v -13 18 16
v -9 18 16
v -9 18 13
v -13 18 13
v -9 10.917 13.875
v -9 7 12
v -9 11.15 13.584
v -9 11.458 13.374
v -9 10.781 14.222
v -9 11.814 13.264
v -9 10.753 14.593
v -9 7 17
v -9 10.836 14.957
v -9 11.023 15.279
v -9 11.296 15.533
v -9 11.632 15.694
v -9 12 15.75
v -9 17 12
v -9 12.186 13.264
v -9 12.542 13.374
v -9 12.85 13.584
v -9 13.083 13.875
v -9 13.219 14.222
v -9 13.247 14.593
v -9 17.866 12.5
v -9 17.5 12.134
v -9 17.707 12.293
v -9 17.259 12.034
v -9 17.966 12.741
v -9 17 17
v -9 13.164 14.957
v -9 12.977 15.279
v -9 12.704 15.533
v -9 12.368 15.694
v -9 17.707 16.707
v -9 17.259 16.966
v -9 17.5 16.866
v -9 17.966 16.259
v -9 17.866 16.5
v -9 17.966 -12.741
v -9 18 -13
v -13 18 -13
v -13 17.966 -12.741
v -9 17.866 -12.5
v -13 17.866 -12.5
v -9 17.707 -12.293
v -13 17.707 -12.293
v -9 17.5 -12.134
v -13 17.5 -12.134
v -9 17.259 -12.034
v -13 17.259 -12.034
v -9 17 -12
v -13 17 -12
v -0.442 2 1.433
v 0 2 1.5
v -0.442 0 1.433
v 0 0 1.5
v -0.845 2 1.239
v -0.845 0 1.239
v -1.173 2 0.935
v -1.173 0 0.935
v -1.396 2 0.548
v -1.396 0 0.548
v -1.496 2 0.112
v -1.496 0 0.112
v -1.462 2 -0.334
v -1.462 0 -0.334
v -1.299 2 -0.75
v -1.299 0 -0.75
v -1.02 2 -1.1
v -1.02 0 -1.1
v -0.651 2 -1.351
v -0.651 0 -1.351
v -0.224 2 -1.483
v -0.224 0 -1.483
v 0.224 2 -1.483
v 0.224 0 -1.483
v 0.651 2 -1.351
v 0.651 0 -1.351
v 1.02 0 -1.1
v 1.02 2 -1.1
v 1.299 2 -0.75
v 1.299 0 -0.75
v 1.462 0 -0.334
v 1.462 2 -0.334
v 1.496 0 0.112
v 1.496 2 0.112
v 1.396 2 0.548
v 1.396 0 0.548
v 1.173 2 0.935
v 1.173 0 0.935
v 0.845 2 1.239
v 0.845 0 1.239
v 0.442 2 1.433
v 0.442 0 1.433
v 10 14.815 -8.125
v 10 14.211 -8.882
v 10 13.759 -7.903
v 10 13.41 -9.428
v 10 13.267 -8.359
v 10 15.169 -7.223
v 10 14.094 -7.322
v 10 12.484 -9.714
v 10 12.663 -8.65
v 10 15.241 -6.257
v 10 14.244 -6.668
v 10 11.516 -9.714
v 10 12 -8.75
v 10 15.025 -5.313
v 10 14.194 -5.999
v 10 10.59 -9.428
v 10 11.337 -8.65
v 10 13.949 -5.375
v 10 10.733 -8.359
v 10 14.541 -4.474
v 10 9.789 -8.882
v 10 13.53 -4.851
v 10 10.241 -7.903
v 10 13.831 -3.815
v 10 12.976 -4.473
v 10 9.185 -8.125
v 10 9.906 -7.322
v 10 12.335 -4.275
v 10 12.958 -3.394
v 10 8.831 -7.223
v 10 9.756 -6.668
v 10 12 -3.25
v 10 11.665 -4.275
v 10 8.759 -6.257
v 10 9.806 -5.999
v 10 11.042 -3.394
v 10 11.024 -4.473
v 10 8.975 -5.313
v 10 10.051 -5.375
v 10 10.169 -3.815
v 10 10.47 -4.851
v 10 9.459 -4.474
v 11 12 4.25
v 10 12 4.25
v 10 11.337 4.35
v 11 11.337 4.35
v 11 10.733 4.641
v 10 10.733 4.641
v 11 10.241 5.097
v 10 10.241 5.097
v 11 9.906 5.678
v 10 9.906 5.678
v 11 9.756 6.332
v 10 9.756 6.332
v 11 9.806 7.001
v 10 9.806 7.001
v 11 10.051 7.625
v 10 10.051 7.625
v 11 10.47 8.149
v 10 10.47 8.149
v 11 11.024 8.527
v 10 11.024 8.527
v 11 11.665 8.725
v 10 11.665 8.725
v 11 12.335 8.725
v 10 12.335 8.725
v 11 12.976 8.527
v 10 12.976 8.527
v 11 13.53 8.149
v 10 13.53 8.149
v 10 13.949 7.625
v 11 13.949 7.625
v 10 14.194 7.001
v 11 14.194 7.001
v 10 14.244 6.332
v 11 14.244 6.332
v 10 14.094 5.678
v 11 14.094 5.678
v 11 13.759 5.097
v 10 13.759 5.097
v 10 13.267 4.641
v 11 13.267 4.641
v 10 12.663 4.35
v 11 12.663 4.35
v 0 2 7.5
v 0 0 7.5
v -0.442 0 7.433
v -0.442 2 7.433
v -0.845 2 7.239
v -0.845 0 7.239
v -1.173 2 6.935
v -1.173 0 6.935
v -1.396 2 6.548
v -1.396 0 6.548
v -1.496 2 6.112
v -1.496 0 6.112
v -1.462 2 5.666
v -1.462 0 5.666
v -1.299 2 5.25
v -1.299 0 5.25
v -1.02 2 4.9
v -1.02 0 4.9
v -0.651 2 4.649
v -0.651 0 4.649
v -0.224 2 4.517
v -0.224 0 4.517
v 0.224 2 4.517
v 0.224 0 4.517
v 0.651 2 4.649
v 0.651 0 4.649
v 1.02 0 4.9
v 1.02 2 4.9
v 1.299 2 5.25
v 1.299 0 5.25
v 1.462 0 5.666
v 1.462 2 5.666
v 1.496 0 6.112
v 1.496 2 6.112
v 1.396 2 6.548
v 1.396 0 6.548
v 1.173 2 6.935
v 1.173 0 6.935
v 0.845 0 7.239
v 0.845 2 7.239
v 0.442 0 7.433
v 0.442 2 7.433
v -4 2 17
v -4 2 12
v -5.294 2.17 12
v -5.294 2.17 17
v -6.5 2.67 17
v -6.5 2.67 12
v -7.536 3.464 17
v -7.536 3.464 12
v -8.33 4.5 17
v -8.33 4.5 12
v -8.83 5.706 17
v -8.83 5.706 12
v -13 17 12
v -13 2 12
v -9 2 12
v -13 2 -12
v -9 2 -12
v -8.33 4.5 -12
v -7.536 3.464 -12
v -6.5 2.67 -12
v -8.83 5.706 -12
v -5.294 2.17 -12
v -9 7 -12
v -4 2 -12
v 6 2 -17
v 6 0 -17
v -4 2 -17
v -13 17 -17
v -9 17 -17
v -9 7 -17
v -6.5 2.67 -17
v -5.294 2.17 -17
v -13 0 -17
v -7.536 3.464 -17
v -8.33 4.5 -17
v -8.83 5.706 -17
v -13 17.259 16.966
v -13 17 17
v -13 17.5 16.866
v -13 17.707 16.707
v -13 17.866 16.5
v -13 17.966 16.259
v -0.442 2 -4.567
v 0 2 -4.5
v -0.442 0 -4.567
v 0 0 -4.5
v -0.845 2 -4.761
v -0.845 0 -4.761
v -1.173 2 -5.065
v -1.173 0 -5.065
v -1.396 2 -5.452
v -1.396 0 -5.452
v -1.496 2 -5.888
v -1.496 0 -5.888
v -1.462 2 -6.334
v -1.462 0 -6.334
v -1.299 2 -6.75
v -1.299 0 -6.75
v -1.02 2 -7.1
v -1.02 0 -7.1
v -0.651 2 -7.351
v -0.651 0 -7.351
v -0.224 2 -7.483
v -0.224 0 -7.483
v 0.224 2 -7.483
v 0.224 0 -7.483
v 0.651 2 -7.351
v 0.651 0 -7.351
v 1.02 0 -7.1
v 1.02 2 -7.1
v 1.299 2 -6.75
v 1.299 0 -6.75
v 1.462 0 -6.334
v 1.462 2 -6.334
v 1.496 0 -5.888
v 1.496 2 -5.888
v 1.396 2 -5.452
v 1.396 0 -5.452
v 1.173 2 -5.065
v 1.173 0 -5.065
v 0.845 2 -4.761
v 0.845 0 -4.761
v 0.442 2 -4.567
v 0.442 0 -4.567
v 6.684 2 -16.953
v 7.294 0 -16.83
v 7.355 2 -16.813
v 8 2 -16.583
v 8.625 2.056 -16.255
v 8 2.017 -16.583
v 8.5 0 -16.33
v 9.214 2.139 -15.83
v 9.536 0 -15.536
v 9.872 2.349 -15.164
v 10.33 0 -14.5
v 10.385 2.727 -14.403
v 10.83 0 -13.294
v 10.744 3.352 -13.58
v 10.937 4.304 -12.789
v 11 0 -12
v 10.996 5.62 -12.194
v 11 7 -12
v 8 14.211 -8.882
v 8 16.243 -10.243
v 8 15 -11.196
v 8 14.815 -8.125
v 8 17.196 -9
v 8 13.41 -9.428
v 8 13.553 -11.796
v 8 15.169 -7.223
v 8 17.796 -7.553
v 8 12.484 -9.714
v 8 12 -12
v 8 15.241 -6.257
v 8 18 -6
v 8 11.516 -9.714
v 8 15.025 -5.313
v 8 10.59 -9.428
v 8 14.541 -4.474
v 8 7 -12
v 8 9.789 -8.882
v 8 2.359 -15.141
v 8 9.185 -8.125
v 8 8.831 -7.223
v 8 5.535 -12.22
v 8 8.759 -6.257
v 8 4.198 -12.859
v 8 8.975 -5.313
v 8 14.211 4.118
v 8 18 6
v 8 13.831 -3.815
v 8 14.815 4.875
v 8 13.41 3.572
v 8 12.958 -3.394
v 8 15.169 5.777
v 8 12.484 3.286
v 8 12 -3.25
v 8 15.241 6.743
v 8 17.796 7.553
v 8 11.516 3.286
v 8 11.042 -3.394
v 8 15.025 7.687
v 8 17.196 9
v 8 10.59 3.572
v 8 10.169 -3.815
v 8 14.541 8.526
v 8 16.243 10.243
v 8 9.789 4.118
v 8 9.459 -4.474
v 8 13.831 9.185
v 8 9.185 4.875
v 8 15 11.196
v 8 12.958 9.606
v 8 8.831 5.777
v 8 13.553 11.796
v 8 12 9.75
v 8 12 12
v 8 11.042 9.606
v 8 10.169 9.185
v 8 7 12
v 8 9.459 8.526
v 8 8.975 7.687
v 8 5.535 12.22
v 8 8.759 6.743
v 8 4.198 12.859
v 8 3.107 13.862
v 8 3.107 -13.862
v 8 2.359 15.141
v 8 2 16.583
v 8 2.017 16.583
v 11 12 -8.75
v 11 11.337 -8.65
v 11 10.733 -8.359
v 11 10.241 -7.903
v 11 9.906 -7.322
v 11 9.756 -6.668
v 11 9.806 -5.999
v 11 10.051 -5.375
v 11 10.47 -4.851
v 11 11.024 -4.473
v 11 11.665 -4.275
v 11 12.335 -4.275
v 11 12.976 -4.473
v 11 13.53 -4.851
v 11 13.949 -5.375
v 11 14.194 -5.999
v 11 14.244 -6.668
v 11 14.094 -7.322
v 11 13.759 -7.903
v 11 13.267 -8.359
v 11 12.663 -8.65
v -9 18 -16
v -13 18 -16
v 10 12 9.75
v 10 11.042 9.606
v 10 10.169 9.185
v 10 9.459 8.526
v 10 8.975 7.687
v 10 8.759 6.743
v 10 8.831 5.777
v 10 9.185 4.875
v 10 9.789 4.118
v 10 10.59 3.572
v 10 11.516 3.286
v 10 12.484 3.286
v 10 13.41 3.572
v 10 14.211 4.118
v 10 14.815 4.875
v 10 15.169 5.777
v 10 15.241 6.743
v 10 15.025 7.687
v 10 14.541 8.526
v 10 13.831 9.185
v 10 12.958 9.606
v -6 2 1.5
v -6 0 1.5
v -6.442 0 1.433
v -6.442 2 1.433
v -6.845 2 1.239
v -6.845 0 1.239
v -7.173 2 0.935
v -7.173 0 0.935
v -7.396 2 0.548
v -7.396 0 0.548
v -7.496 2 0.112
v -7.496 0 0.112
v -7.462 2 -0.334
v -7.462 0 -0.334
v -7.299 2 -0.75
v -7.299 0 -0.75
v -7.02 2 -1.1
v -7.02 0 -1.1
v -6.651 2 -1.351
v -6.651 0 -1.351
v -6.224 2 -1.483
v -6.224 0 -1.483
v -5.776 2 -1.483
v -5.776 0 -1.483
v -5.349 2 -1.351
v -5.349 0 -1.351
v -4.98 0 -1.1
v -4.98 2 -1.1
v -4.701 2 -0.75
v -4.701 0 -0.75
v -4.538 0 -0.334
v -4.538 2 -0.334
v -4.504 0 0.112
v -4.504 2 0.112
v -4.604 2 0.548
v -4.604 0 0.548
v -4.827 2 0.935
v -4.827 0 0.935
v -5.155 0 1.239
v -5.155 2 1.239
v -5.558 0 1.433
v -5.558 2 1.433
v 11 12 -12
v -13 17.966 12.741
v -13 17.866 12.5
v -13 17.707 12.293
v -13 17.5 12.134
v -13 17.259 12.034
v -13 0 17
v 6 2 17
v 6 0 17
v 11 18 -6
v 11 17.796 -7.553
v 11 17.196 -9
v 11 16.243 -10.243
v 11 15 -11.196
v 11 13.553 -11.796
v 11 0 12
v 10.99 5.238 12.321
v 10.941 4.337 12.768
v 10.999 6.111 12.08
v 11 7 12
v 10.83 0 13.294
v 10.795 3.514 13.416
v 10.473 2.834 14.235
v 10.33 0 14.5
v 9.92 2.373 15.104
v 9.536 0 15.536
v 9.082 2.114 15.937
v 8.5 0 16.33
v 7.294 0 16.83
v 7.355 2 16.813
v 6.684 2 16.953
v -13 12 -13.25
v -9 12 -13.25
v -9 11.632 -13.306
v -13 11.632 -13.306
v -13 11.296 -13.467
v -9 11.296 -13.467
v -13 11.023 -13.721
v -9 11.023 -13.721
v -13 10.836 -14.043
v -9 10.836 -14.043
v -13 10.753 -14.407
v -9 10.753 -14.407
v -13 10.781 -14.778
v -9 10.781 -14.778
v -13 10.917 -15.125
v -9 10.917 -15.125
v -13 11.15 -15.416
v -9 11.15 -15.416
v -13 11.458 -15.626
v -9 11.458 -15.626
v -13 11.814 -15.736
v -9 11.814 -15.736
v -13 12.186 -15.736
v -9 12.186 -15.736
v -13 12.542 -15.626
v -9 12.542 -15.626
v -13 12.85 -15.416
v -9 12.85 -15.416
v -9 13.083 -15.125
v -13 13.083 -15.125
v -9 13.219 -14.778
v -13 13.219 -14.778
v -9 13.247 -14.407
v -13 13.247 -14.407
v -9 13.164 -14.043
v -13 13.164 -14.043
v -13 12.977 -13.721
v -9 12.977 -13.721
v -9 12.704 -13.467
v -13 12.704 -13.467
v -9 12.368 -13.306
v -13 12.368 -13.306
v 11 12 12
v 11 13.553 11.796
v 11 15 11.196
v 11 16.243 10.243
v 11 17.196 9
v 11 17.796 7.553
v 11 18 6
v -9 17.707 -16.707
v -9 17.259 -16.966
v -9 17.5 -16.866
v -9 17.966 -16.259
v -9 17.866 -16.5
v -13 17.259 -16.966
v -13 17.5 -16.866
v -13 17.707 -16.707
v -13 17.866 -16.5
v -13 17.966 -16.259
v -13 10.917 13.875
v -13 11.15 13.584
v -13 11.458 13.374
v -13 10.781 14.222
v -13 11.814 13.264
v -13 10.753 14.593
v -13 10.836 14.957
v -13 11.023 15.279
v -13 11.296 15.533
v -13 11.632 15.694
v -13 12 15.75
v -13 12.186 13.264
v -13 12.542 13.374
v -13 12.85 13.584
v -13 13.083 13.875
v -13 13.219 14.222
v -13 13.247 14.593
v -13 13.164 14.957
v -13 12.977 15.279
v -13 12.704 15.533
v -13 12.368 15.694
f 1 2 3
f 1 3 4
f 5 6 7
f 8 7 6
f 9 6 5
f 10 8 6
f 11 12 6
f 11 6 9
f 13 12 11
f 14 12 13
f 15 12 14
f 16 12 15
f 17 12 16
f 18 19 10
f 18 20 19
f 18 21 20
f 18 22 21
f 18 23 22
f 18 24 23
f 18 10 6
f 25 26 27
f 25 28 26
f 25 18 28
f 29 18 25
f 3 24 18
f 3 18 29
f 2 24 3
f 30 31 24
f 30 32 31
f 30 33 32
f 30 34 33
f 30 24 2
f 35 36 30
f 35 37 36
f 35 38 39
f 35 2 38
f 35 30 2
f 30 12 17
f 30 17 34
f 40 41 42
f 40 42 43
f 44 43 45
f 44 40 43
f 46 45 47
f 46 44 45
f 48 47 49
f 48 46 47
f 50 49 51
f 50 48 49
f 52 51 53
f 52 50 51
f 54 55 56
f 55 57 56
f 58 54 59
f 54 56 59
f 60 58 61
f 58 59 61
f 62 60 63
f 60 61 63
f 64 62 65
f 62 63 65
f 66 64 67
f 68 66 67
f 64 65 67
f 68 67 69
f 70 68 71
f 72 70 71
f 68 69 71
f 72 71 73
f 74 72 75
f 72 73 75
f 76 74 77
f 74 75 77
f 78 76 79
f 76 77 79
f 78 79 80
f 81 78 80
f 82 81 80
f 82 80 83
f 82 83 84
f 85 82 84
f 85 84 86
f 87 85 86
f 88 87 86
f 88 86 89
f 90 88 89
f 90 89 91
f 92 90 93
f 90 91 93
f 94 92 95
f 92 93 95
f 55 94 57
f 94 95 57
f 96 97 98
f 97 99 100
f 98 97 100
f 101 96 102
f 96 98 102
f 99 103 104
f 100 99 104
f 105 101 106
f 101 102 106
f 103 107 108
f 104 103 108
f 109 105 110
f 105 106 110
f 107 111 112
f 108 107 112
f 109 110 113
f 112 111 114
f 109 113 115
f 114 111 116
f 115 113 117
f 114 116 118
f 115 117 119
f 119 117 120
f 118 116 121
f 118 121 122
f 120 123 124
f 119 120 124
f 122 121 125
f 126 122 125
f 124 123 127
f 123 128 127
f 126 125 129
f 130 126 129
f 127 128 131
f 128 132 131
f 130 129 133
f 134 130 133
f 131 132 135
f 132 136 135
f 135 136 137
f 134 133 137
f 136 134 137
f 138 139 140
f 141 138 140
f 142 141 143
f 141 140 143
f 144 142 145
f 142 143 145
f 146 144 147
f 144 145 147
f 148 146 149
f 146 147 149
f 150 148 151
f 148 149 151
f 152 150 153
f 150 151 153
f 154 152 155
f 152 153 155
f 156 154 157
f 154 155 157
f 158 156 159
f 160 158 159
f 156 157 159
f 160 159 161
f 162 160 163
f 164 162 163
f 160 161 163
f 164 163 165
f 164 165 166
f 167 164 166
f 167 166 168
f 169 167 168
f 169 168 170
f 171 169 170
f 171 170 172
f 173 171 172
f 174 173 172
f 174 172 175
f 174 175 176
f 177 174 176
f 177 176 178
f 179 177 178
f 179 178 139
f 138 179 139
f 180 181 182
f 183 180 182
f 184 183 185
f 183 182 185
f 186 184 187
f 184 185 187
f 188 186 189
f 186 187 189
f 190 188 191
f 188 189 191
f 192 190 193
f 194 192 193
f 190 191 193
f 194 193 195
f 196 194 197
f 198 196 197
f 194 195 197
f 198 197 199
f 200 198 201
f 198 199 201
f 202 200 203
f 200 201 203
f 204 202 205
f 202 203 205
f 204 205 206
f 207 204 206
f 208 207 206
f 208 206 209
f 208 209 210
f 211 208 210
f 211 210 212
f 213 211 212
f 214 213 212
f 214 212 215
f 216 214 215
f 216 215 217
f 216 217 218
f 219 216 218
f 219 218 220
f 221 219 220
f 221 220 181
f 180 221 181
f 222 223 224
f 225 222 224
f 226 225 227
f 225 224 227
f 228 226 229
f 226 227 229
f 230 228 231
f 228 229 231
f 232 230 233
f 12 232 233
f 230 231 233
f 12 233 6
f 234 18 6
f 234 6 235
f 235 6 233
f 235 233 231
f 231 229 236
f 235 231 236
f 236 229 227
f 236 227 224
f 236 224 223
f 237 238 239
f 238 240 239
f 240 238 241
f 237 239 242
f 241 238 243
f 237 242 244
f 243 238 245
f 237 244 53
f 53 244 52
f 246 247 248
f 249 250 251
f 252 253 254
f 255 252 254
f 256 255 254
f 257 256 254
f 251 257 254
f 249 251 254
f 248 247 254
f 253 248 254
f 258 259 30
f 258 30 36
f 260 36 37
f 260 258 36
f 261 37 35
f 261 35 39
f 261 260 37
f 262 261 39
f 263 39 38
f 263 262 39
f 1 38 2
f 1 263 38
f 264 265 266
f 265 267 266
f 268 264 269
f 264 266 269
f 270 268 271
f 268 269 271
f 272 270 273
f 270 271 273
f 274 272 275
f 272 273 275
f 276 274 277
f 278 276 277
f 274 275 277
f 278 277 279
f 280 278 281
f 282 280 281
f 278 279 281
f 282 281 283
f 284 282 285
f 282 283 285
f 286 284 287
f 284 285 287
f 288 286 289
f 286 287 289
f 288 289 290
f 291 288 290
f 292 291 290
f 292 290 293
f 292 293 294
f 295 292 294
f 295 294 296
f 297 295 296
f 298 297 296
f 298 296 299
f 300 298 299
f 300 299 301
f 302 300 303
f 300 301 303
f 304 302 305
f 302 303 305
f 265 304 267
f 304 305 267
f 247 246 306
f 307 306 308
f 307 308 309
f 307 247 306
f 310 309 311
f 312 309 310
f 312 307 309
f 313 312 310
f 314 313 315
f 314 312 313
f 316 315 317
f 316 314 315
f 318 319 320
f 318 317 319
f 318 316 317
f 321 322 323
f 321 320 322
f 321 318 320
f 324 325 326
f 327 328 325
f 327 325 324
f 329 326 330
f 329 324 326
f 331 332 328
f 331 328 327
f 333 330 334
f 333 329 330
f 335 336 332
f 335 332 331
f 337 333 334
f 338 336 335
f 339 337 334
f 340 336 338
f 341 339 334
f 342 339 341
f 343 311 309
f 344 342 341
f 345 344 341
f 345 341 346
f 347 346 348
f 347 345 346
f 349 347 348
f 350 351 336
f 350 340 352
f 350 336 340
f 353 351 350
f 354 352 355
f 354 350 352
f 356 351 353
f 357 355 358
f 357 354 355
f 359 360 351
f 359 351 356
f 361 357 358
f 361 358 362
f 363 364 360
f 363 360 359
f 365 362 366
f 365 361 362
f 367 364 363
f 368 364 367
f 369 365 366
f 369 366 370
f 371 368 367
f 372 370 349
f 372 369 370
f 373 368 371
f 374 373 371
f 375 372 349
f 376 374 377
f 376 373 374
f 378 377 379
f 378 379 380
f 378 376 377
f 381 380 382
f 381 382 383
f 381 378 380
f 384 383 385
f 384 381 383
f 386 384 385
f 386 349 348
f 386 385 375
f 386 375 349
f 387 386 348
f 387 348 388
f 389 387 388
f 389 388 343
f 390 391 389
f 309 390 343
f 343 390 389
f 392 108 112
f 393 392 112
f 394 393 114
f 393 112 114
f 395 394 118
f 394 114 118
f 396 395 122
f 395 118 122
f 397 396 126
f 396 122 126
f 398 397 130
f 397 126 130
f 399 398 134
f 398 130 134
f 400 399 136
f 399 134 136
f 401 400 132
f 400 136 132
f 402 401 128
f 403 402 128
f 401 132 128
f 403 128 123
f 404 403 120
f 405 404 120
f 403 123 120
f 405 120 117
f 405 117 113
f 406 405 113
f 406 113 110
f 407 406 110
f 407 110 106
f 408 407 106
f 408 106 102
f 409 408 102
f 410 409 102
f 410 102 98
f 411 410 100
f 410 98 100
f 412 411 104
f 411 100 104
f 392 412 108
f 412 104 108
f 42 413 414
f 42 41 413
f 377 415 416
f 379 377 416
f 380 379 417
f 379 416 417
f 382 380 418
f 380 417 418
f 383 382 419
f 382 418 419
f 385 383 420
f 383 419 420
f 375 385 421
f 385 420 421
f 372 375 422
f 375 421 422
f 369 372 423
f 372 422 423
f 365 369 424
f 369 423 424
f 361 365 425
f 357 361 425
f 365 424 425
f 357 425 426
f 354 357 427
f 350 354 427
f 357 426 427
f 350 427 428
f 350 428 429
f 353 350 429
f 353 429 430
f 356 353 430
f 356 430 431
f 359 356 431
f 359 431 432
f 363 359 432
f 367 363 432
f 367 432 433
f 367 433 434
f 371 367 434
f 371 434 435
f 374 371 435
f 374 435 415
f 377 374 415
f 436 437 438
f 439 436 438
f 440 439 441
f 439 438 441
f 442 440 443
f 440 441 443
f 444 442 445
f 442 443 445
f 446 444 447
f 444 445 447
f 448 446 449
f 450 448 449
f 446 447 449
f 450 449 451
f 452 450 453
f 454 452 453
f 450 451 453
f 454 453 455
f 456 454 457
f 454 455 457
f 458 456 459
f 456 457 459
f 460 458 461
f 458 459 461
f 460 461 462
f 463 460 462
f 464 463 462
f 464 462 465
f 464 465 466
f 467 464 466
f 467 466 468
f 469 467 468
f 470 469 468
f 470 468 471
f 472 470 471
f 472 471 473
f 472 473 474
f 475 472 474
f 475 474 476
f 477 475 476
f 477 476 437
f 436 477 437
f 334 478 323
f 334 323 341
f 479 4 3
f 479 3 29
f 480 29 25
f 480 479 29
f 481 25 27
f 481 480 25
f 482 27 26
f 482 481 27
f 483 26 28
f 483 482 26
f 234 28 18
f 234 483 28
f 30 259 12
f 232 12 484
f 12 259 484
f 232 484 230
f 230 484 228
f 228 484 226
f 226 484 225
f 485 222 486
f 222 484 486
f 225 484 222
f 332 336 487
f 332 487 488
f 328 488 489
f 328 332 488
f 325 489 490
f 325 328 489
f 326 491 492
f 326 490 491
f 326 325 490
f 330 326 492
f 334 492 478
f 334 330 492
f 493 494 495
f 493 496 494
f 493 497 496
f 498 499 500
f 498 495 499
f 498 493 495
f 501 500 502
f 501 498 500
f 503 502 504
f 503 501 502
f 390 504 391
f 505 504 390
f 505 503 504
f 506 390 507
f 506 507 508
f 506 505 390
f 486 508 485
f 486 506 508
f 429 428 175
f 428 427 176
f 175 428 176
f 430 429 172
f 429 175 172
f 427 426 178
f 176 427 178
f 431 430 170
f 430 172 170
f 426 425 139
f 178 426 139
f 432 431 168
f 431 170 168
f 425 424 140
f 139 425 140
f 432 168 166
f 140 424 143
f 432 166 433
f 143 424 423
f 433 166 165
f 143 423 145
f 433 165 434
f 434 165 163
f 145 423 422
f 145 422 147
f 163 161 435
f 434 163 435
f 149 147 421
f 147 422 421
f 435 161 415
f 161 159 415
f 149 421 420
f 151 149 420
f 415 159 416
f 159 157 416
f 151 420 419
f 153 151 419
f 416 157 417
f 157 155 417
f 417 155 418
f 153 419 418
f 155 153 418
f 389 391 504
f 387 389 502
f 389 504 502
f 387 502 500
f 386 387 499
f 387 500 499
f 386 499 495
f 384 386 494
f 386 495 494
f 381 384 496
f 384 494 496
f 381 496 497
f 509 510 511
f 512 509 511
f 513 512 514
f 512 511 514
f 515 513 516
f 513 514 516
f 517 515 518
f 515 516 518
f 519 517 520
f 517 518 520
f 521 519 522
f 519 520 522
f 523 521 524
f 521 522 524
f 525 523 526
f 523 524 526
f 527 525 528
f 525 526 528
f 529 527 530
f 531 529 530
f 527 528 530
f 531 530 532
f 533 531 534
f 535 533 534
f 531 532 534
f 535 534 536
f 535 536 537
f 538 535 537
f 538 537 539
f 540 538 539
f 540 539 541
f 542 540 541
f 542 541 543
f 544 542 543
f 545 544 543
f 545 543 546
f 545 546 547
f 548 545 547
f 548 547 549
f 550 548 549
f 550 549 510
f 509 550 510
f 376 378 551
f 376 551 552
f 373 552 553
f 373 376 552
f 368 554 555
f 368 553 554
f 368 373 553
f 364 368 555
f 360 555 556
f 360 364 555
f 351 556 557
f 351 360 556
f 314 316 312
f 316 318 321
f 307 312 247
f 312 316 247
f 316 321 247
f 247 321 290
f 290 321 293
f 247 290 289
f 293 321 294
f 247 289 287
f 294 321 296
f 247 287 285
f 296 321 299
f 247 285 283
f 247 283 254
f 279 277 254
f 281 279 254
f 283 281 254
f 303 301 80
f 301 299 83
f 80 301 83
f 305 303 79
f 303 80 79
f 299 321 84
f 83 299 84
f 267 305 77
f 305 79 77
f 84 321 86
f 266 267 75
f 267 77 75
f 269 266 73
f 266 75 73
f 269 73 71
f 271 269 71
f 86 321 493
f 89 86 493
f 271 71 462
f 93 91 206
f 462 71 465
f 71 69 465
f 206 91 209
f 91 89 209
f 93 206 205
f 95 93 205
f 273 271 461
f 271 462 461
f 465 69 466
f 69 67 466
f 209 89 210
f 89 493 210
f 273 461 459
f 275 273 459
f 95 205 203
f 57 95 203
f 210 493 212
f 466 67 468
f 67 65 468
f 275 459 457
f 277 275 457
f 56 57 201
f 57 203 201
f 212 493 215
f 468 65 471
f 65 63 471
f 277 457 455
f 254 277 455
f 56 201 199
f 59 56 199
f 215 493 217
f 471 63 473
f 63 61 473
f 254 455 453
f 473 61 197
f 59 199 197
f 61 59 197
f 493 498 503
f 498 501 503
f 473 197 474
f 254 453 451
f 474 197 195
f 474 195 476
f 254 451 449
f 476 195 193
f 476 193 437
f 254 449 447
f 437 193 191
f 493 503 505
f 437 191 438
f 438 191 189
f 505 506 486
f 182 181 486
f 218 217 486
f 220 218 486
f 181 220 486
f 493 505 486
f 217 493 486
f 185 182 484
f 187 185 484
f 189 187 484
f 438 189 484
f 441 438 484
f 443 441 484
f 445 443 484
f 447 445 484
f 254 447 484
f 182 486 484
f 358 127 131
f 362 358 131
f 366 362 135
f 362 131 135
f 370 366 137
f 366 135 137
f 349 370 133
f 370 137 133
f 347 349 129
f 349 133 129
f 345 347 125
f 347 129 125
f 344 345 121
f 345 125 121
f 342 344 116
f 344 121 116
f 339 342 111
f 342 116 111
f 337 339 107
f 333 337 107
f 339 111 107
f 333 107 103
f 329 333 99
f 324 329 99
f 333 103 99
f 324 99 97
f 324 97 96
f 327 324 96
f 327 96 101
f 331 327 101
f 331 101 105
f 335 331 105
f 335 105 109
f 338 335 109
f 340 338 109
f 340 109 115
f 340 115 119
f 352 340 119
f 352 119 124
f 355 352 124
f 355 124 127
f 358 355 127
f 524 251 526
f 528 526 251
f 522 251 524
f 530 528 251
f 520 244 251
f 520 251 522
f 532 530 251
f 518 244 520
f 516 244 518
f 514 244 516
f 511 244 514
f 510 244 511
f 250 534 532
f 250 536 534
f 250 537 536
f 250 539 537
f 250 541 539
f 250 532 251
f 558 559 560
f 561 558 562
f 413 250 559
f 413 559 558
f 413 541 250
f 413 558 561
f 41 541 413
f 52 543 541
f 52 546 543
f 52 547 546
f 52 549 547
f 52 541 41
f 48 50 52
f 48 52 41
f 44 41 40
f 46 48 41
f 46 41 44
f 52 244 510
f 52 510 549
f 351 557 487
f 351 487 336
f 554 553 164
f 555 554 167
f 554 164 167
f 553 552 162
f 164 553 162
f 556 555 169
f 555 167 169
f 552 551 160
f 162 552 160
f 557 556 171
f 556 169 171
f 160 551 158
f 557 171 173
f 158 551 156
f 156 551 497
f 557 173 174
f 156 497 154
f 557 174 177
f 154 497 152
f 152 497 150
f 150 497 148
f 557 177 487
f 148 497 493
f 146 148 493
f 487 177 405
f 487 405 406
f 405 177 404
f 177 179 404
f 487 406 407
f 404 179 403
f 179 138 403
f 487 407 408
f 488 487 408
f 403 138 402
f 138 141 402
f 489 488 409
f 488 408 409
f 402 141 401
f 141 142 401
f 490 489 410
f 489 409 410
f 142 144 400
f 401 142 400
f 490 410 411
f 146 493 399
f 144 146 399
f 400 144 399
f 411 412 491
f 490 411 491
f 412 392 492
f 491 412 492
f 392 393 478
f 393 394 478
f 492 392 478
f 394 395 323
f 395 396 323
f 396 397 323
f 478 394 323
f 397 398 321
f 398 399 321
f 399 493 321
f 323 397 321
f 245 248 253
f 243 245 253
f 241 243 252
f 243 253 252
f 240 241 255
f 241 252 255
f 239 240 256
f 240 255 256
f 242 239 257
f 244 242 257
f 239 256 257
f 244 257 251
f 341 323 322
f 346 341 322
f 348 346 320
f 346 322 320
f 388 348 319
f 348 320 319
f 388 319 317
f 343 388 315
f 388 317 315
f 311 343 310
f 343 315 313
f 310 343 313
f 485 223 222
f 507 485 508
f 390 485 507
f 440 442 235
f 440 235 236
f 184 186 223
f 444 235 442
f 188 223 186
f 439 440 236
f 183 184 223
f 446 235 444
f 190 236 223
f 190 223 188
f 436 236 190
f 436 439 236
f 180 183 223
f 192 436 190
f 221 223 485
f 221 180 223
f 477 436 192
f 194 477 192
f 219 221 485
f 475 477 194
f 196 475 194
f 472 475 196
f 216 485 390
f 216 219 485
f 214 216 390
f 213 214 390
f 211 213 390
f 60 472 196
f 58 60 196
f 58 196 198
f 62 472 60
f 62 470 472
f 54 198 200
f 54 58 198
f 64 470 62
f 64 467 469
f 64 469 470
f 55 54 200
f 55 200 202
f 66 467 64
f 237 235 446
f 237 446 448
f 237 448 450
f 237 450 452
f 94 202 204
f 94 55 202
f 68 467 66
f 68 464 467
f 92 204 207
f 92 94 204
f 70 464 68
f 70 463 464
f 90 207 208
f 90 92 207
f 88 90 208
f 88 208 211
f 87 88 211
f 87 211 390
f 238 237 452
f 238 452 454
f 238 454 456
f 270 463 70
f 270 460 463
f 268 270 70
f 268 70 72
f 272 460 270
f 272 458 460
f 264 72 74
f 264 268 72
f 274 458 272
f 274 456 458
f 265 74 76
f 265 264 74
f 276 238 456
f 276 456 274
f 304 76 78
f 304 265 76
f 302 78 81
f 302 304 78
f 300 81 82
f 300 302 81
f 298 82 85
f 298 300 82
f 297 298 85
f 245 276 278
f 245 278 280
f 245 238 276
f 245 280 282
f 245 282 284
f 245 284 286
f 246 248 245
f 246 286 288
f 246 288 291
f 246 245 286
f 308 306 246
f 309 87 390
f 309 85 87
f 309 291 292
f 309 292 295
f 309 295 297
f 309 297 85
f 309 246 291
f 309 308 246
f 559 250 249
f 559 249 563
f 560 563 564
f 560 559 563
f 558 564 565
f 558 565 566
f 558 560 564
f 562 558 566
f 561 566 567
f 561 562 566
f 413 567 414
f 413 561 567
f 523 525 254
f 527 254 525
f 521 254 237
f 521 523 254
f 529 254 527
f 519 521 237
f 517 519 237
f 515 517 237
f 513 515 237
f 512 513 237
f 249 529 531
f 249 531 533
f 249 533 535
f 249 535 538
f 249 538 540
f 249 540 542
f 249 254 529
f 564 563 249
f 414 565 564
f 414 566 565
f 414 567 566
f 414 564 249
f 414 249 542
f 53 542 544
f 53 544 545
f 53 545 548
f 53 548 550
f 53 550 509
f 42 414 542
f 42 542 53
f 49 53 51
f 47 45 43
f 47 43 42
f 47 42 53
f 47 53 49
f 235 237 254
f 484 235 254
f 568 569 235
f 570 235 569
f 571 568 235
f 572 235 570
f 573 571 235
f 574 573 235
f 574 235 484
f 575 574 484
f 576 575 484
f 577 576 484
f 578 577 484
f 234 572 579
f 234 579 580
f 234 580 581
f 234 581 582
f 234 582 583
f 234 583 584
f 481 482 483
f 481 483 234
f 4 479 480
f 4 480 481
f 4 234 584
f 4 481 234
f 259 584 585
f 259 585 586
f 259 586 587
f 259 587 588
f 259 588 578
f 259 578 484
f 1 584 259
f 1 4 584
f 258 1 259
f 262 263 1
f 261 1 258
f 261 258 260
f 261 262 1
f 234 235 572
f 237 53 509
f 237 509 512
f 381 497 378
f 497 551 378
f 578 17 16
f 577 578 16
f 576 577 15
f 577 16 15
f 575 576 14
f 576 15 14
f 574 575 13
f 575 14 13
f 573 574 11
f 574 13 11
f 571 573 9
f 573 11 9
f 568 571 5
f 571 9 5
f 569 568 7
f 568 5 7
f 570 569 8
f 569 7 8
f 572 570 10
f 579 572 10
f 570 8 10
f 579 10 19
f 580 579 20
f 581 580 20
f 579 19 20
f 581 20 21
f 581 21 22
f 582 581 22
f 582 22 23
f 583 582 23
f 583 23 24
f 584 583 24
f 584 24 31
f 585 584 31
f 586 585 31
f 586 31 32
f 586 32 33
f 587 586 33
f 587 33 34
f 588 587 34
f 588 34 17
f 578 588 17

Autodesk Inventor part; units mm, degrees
ref_plane "YZ Plane" through (0, 0, 0) normal (1, 0, 0) x (0, 1, 0)
ref_plane "XZ Plane" through (0, 0, 0) normal (0, 1, 0) x (-1, 0, 0)
ref_plane "XY Plane" through (0, 0, 0) normal (0, 0, 1) x (1, 0, 0)
sketch "Sketch1" plane through (0, 0, 0) normal (0, 1, 0) x (-1, 0, 0)
  line L0 (15.4, 0) -> (-15.4, 0) projected
  line L1 (0, -23.8) -> (0, 23.8) projected
  line L2 (11, 17) -> (-11, 17)
  line L3 (-11, 17) -> (-11, -17)
  line L4 (-11, -17) -> (11, -17)
  line L5 (11, -17) -> (11, 17)
  point P0 (0, 0)
  dimension "d0" = 22
  dimension "d1" = 34
extrude "Extrusion1" add sketch "Sketch1" along normal blind 18
sketch "Sketch2" plane through (0, 18, 0) normal (0, 1, 0) x (1, 0, 0)
  line L0 (-11, -12) -> (8, -12)
  line L1 (8, -12) -> (8, 12)
  line L2 (8, 12) -> (-11, 12)
  line L3 (-11, 12) -> (-11, -12)
  line L4 (-11, -17) -> (11, -17) projected
  line L5 (11, -17) -> (11, 17) projected
  line L6 (11, 17) -> (-11, 17) projected
  line L7 (-11, 17) -> (-11, -17) projected
  line L8 (-15.4, 0) -> (15.4, 0) projected
  point P0 (0, 0)
  dimension "d5" = 24
  dimension "d6" = 3
extrude "Extrusion2" cut sketch "Sketch2" against normal blind 16 contours L3 L8 L1 L0 | L3 L2 L1 L8
sketch "Sketch3" plane through (-11, 0, 17) normal (0, 0, 1) x (1, 0, 0)
  line L0 (4, 18) -> (19, 18)
  line L1 (19, 18) -> (19, 2)
  line L2 (19, 2) -> (4, 2)
  line L3 (4, 2) -> (4, 18)
  line L4 (0, 18) -> (22, 18) projected
  line L5 (0, 0) -> (0, 18) projected
  line L6 (22, 0) -> (22, 18) projected
  line L7 (0, 0) -> (22, 0) projected
  point P0 (11, 0)
  dimension "d9" = 4
  dimension "d10" = 3
  dimension "d11" = 2
extrude "Extrusion3" cut sketch "Sketch3" against normal through all contours L0 L1 L2 L3
sketch "Sketch6" plane through (0, 2, 0) normal (0, 1, 0) x (1, 0, 0)
  line L0 (-11, 12) -> (-7, 12) projected
  line L1 (-11, -12) -> (-11, 12) projected
  line L2 (-7, -12) -> (-11, -12) projected
  line L3 (-7, -17) -> (-7, -12) projected
  line L4 (8, -17) -> (-7, -17) projected
  line L5 (-7, 17) -> (8, 17) projected
  line L6 (-7, 12) -> (-7, 17) projected
  line L7 (-15.4, 0) -> (15.4, 0) projected
  line L8 (0, 23.8) -> (0, -23.8) projected
  line L9 (8, -17) -> (8, 17) projected
  point P0 (0, 0)
  point P1 (0, 0)
  point P2 (0, 6)
  point P3 (0, -6)
  point P4 (-6, 0)
  dimension "d15" = 6
  dimension "d16" = 6
  dimension "d18" = 6
hole "Hole1" at (0, 2, -6) at (0, 2, 0) at (0, 2, 6) at (-6, 2, 0) direction (0, -1, 0) diameter 3 end through all
sketch "Sketch8" plane through (11, 0, 17) normal (1, 0, 0) x (0, 0, -1)
  line L0 (0, 0) -> (34, 0) projected
  line L1 (34, 0) -> (34, 18) projected
  line L2 (0, 18) -> (34, 18) projected
  line L3 (0, 0) -> (0, 18) projected
  line L4 (29, 2) -> (29, 18) projected
  line L5 (5, 18) -> (5, 2) projected
  line L6 (29, 2) -> (5, 2) projected
  point P0 (17, 0)
  point P1 (0, 2)
  point P2 (34, 2)
  point P3 (23.5, 12)
  point P4 (10.5, 12)
  dimension "d28" = 5.5
  dimension "d29" = 5.5
  dimension "d30" = 6
  dimension "d31" = 6
hole "Hole2" at (11, 12, -6.5) at (11, 12, 6.5) direction (-1, 0, 0) diameter 4.5 end through all
sketch "Sketch12" plane through (0, 18, 0) normal (0, 1, 0) x (1, 0, 0)
  line L0 (8, 17) -> (8, -17) projected
  line L1 (8, -17) -> (11, -17) projected
  line L2 (11, -17) -> (11, 17) projected
  line L3 (11, 17) -> (8, 17) projected
  line L4 (8, -17) -> (11, -17)
  line L5 (11, -17) -> (11, -12)
  line L6 (11, -12) -> (8, -12)
  line L7 (8, -12) -> (8, -17)
  line L8 (8, 17) -> (11, 17)
  line L9 (11, 17) -> (11, 12)
  line L10 (11, 12) -> (8, 12)
  line L11 (8, 12) -> (8, 17)
  line L12 (-7, -17) -> (-7, -12) projected
  line L13 (-7, -12) -> (-11, -12) projected
  line L14 (-11, -12) -> (-11, -17) projected
  line L15 (-11, -17) -> (-7, -17) projected
  line L16 (-7, 12) -> (-7, 17) projected
  line L17 (-7, 17) -> (-11, 17) projected
  line L18 (-11, 17) -> (-11, 12) projected
  line L19 (-11, 12) -> (-7, 12) projected
  point P0 (0, 0)
extrude "Extrusion5" cut sketch "Sketch12" against normal blind 16 contours L3 L2 L10 L0 | L6 L2 L1 L0
sketch "Sketch17" plane through (-11, 0, -17) normal (-1, 0, 0) x (0, 0, 1)
  line L0 (29, 18) -> (29, 2) projected
  line L1 (29, 2) -> (5, 2) projected
  line L2 (5, 2) -> (5, 18) projected
  line L3 (0, 18) -> (5, 18) projected
  line L4 (0, 0) -> (0, 18) projected
  line L5 (0, 0) -> (34, 0) projected
  line L6 (34, 0) -> (34, 18) projected
  line L7 (29, 18) -> (34, 18) projected
  line L8 (34, 0) -> (0, 0) projected
  line L9 (29, 18) -> (29, 2) projected
  line L10 (34, 0) -> (29, 0)
  line L11 (29, 0) -> (29, 18)
  line L12 (29, 18) -> (34, 18)
  line L13 (34, 18) -> (34, 0)
  line L14 (0, 18) -> (5, 18) projected
  line L15 (0, 0) -> (5, 0)
  line L16 (5, 0) -> (5, 18)
  line L17 (5, 18) -> (0, 18)
  line L18 (0, 18) -> (0, 0)
  line L19 (0, 2) -> (5, 2) projected
  line L20 (34, 0) -> (0, 0)
  line L21 (0, 0) -> (0, 2)
  line L22 (0, 2) -> (34, 2)
  line L23 (34, 2) -> (34, 0)
  point P0 (17, 0)
extrude "Extrusion6" add sketch "Sketch17" along normal blind 2
sketch "Sketch19" plane through (8, 18, -12) normal (-1, 0, 0) x (0, 0, 1)
  circle A0 centre (18.5, -6) radius 2.25 projected
  circle A1 centre (5.5, -6) radius 2.25 projected
  line L0 (24, -16) -> (24, 0) projected
  line L1 (0, 0) -> (24, 0) projected
  line L2 (0, 0) -> (0, -16) projected
  line L3 (24, -16) -> (0, -16) projected
  point P0 (12, -18)
hole "Hole4" at (8, 12, 6.5) at (8, 12, -6.5) direction (1, 0, 0) diameter 6.5 depth 2
fillet "Fillet9" radius 6 2 edges at (9.5, 18, -12) (9.5, 18, 12)
fillet "Fillet10" radius 5 4 edges at (9.5, 2, 12) (9.5, 2, -12) (11, 1, 17) (11, 1, -17)
sketch "Sketch20" plane through (-13, 0, -17) normal (-1, 0, 0) x (0, 0, 1)
  line L0 (0, 0) -> (34, 0) projected
  line L1 (34, 0) -> (34, 18) projected
  line L2 (34, 18) -> (29, 18) projected
  line L3 (29, 18) -> (29, 2) projected
  line L4 (29, 2) -> (5, 2) projected
  line L5 (5, 2) -> (5, 18) projected
  line L6 (5, 18) -> (0, 18) projected
  line L7 (0, 18) -> (0, 0) projected
  point P0 (17, 0)
  point P1 (2.5, 12)
  point P2 (31.5, 12)
  dimension "d85" = 6
  dimension "d86" = 2.5
  dimension "d87" = 2.5
  dimension "d88" = 6
hole "Hole5" at (-13, 12, -14.5) at (-13, 12, 14.5) direction (1, 0, 0) diameter 2.5 end through all
sketch "Sketch21" plane through (-7, 2, 17) normal (0, 0, 1) x (1, 0, 0)
  line L0 (-2, 16) -> (0, 16)
  line L1 (0, 16) -> (0, 0)
  line L2 (0, 0) -> (-2, 0)
  line L3 (-2, 0) -> (-2, 16)
  line L4 (13, 0) -> (13, -2) projected
  line L5 (13, 0) -> (0, 0) projected
  line L6 (0, 0) -> (0, 16) projected
  line L7 (0, 16) -> (-6, 16) projected
  line L8 (-6, -2) -> (-6, 16) projected
  line L9 (-6, -2) -> (13, -2) projected
  line L10 (13, 0) -> (0, 0) projected
  line L11 (0, 16) -> (-6, 16) projected
  line L12 (0, 0) -> (0, 16) projected
  point P0 (7, -2)
  dimension "d96" = 4
extrude "Extrusion7" cut sketch "Sketch21" against normal through all contours L0 L1 L2 L3
fillet "Fillet11" radius 5 2 edges at (-9, 2, 14.5) (-9, 2, -14.5)
fillet "Fillet12" radius 1 4 edges at (-11, 18, 17) (-11, 18, 12) (-11, 18, -12) (-11, 18, -17)
properties part number "bracket"
